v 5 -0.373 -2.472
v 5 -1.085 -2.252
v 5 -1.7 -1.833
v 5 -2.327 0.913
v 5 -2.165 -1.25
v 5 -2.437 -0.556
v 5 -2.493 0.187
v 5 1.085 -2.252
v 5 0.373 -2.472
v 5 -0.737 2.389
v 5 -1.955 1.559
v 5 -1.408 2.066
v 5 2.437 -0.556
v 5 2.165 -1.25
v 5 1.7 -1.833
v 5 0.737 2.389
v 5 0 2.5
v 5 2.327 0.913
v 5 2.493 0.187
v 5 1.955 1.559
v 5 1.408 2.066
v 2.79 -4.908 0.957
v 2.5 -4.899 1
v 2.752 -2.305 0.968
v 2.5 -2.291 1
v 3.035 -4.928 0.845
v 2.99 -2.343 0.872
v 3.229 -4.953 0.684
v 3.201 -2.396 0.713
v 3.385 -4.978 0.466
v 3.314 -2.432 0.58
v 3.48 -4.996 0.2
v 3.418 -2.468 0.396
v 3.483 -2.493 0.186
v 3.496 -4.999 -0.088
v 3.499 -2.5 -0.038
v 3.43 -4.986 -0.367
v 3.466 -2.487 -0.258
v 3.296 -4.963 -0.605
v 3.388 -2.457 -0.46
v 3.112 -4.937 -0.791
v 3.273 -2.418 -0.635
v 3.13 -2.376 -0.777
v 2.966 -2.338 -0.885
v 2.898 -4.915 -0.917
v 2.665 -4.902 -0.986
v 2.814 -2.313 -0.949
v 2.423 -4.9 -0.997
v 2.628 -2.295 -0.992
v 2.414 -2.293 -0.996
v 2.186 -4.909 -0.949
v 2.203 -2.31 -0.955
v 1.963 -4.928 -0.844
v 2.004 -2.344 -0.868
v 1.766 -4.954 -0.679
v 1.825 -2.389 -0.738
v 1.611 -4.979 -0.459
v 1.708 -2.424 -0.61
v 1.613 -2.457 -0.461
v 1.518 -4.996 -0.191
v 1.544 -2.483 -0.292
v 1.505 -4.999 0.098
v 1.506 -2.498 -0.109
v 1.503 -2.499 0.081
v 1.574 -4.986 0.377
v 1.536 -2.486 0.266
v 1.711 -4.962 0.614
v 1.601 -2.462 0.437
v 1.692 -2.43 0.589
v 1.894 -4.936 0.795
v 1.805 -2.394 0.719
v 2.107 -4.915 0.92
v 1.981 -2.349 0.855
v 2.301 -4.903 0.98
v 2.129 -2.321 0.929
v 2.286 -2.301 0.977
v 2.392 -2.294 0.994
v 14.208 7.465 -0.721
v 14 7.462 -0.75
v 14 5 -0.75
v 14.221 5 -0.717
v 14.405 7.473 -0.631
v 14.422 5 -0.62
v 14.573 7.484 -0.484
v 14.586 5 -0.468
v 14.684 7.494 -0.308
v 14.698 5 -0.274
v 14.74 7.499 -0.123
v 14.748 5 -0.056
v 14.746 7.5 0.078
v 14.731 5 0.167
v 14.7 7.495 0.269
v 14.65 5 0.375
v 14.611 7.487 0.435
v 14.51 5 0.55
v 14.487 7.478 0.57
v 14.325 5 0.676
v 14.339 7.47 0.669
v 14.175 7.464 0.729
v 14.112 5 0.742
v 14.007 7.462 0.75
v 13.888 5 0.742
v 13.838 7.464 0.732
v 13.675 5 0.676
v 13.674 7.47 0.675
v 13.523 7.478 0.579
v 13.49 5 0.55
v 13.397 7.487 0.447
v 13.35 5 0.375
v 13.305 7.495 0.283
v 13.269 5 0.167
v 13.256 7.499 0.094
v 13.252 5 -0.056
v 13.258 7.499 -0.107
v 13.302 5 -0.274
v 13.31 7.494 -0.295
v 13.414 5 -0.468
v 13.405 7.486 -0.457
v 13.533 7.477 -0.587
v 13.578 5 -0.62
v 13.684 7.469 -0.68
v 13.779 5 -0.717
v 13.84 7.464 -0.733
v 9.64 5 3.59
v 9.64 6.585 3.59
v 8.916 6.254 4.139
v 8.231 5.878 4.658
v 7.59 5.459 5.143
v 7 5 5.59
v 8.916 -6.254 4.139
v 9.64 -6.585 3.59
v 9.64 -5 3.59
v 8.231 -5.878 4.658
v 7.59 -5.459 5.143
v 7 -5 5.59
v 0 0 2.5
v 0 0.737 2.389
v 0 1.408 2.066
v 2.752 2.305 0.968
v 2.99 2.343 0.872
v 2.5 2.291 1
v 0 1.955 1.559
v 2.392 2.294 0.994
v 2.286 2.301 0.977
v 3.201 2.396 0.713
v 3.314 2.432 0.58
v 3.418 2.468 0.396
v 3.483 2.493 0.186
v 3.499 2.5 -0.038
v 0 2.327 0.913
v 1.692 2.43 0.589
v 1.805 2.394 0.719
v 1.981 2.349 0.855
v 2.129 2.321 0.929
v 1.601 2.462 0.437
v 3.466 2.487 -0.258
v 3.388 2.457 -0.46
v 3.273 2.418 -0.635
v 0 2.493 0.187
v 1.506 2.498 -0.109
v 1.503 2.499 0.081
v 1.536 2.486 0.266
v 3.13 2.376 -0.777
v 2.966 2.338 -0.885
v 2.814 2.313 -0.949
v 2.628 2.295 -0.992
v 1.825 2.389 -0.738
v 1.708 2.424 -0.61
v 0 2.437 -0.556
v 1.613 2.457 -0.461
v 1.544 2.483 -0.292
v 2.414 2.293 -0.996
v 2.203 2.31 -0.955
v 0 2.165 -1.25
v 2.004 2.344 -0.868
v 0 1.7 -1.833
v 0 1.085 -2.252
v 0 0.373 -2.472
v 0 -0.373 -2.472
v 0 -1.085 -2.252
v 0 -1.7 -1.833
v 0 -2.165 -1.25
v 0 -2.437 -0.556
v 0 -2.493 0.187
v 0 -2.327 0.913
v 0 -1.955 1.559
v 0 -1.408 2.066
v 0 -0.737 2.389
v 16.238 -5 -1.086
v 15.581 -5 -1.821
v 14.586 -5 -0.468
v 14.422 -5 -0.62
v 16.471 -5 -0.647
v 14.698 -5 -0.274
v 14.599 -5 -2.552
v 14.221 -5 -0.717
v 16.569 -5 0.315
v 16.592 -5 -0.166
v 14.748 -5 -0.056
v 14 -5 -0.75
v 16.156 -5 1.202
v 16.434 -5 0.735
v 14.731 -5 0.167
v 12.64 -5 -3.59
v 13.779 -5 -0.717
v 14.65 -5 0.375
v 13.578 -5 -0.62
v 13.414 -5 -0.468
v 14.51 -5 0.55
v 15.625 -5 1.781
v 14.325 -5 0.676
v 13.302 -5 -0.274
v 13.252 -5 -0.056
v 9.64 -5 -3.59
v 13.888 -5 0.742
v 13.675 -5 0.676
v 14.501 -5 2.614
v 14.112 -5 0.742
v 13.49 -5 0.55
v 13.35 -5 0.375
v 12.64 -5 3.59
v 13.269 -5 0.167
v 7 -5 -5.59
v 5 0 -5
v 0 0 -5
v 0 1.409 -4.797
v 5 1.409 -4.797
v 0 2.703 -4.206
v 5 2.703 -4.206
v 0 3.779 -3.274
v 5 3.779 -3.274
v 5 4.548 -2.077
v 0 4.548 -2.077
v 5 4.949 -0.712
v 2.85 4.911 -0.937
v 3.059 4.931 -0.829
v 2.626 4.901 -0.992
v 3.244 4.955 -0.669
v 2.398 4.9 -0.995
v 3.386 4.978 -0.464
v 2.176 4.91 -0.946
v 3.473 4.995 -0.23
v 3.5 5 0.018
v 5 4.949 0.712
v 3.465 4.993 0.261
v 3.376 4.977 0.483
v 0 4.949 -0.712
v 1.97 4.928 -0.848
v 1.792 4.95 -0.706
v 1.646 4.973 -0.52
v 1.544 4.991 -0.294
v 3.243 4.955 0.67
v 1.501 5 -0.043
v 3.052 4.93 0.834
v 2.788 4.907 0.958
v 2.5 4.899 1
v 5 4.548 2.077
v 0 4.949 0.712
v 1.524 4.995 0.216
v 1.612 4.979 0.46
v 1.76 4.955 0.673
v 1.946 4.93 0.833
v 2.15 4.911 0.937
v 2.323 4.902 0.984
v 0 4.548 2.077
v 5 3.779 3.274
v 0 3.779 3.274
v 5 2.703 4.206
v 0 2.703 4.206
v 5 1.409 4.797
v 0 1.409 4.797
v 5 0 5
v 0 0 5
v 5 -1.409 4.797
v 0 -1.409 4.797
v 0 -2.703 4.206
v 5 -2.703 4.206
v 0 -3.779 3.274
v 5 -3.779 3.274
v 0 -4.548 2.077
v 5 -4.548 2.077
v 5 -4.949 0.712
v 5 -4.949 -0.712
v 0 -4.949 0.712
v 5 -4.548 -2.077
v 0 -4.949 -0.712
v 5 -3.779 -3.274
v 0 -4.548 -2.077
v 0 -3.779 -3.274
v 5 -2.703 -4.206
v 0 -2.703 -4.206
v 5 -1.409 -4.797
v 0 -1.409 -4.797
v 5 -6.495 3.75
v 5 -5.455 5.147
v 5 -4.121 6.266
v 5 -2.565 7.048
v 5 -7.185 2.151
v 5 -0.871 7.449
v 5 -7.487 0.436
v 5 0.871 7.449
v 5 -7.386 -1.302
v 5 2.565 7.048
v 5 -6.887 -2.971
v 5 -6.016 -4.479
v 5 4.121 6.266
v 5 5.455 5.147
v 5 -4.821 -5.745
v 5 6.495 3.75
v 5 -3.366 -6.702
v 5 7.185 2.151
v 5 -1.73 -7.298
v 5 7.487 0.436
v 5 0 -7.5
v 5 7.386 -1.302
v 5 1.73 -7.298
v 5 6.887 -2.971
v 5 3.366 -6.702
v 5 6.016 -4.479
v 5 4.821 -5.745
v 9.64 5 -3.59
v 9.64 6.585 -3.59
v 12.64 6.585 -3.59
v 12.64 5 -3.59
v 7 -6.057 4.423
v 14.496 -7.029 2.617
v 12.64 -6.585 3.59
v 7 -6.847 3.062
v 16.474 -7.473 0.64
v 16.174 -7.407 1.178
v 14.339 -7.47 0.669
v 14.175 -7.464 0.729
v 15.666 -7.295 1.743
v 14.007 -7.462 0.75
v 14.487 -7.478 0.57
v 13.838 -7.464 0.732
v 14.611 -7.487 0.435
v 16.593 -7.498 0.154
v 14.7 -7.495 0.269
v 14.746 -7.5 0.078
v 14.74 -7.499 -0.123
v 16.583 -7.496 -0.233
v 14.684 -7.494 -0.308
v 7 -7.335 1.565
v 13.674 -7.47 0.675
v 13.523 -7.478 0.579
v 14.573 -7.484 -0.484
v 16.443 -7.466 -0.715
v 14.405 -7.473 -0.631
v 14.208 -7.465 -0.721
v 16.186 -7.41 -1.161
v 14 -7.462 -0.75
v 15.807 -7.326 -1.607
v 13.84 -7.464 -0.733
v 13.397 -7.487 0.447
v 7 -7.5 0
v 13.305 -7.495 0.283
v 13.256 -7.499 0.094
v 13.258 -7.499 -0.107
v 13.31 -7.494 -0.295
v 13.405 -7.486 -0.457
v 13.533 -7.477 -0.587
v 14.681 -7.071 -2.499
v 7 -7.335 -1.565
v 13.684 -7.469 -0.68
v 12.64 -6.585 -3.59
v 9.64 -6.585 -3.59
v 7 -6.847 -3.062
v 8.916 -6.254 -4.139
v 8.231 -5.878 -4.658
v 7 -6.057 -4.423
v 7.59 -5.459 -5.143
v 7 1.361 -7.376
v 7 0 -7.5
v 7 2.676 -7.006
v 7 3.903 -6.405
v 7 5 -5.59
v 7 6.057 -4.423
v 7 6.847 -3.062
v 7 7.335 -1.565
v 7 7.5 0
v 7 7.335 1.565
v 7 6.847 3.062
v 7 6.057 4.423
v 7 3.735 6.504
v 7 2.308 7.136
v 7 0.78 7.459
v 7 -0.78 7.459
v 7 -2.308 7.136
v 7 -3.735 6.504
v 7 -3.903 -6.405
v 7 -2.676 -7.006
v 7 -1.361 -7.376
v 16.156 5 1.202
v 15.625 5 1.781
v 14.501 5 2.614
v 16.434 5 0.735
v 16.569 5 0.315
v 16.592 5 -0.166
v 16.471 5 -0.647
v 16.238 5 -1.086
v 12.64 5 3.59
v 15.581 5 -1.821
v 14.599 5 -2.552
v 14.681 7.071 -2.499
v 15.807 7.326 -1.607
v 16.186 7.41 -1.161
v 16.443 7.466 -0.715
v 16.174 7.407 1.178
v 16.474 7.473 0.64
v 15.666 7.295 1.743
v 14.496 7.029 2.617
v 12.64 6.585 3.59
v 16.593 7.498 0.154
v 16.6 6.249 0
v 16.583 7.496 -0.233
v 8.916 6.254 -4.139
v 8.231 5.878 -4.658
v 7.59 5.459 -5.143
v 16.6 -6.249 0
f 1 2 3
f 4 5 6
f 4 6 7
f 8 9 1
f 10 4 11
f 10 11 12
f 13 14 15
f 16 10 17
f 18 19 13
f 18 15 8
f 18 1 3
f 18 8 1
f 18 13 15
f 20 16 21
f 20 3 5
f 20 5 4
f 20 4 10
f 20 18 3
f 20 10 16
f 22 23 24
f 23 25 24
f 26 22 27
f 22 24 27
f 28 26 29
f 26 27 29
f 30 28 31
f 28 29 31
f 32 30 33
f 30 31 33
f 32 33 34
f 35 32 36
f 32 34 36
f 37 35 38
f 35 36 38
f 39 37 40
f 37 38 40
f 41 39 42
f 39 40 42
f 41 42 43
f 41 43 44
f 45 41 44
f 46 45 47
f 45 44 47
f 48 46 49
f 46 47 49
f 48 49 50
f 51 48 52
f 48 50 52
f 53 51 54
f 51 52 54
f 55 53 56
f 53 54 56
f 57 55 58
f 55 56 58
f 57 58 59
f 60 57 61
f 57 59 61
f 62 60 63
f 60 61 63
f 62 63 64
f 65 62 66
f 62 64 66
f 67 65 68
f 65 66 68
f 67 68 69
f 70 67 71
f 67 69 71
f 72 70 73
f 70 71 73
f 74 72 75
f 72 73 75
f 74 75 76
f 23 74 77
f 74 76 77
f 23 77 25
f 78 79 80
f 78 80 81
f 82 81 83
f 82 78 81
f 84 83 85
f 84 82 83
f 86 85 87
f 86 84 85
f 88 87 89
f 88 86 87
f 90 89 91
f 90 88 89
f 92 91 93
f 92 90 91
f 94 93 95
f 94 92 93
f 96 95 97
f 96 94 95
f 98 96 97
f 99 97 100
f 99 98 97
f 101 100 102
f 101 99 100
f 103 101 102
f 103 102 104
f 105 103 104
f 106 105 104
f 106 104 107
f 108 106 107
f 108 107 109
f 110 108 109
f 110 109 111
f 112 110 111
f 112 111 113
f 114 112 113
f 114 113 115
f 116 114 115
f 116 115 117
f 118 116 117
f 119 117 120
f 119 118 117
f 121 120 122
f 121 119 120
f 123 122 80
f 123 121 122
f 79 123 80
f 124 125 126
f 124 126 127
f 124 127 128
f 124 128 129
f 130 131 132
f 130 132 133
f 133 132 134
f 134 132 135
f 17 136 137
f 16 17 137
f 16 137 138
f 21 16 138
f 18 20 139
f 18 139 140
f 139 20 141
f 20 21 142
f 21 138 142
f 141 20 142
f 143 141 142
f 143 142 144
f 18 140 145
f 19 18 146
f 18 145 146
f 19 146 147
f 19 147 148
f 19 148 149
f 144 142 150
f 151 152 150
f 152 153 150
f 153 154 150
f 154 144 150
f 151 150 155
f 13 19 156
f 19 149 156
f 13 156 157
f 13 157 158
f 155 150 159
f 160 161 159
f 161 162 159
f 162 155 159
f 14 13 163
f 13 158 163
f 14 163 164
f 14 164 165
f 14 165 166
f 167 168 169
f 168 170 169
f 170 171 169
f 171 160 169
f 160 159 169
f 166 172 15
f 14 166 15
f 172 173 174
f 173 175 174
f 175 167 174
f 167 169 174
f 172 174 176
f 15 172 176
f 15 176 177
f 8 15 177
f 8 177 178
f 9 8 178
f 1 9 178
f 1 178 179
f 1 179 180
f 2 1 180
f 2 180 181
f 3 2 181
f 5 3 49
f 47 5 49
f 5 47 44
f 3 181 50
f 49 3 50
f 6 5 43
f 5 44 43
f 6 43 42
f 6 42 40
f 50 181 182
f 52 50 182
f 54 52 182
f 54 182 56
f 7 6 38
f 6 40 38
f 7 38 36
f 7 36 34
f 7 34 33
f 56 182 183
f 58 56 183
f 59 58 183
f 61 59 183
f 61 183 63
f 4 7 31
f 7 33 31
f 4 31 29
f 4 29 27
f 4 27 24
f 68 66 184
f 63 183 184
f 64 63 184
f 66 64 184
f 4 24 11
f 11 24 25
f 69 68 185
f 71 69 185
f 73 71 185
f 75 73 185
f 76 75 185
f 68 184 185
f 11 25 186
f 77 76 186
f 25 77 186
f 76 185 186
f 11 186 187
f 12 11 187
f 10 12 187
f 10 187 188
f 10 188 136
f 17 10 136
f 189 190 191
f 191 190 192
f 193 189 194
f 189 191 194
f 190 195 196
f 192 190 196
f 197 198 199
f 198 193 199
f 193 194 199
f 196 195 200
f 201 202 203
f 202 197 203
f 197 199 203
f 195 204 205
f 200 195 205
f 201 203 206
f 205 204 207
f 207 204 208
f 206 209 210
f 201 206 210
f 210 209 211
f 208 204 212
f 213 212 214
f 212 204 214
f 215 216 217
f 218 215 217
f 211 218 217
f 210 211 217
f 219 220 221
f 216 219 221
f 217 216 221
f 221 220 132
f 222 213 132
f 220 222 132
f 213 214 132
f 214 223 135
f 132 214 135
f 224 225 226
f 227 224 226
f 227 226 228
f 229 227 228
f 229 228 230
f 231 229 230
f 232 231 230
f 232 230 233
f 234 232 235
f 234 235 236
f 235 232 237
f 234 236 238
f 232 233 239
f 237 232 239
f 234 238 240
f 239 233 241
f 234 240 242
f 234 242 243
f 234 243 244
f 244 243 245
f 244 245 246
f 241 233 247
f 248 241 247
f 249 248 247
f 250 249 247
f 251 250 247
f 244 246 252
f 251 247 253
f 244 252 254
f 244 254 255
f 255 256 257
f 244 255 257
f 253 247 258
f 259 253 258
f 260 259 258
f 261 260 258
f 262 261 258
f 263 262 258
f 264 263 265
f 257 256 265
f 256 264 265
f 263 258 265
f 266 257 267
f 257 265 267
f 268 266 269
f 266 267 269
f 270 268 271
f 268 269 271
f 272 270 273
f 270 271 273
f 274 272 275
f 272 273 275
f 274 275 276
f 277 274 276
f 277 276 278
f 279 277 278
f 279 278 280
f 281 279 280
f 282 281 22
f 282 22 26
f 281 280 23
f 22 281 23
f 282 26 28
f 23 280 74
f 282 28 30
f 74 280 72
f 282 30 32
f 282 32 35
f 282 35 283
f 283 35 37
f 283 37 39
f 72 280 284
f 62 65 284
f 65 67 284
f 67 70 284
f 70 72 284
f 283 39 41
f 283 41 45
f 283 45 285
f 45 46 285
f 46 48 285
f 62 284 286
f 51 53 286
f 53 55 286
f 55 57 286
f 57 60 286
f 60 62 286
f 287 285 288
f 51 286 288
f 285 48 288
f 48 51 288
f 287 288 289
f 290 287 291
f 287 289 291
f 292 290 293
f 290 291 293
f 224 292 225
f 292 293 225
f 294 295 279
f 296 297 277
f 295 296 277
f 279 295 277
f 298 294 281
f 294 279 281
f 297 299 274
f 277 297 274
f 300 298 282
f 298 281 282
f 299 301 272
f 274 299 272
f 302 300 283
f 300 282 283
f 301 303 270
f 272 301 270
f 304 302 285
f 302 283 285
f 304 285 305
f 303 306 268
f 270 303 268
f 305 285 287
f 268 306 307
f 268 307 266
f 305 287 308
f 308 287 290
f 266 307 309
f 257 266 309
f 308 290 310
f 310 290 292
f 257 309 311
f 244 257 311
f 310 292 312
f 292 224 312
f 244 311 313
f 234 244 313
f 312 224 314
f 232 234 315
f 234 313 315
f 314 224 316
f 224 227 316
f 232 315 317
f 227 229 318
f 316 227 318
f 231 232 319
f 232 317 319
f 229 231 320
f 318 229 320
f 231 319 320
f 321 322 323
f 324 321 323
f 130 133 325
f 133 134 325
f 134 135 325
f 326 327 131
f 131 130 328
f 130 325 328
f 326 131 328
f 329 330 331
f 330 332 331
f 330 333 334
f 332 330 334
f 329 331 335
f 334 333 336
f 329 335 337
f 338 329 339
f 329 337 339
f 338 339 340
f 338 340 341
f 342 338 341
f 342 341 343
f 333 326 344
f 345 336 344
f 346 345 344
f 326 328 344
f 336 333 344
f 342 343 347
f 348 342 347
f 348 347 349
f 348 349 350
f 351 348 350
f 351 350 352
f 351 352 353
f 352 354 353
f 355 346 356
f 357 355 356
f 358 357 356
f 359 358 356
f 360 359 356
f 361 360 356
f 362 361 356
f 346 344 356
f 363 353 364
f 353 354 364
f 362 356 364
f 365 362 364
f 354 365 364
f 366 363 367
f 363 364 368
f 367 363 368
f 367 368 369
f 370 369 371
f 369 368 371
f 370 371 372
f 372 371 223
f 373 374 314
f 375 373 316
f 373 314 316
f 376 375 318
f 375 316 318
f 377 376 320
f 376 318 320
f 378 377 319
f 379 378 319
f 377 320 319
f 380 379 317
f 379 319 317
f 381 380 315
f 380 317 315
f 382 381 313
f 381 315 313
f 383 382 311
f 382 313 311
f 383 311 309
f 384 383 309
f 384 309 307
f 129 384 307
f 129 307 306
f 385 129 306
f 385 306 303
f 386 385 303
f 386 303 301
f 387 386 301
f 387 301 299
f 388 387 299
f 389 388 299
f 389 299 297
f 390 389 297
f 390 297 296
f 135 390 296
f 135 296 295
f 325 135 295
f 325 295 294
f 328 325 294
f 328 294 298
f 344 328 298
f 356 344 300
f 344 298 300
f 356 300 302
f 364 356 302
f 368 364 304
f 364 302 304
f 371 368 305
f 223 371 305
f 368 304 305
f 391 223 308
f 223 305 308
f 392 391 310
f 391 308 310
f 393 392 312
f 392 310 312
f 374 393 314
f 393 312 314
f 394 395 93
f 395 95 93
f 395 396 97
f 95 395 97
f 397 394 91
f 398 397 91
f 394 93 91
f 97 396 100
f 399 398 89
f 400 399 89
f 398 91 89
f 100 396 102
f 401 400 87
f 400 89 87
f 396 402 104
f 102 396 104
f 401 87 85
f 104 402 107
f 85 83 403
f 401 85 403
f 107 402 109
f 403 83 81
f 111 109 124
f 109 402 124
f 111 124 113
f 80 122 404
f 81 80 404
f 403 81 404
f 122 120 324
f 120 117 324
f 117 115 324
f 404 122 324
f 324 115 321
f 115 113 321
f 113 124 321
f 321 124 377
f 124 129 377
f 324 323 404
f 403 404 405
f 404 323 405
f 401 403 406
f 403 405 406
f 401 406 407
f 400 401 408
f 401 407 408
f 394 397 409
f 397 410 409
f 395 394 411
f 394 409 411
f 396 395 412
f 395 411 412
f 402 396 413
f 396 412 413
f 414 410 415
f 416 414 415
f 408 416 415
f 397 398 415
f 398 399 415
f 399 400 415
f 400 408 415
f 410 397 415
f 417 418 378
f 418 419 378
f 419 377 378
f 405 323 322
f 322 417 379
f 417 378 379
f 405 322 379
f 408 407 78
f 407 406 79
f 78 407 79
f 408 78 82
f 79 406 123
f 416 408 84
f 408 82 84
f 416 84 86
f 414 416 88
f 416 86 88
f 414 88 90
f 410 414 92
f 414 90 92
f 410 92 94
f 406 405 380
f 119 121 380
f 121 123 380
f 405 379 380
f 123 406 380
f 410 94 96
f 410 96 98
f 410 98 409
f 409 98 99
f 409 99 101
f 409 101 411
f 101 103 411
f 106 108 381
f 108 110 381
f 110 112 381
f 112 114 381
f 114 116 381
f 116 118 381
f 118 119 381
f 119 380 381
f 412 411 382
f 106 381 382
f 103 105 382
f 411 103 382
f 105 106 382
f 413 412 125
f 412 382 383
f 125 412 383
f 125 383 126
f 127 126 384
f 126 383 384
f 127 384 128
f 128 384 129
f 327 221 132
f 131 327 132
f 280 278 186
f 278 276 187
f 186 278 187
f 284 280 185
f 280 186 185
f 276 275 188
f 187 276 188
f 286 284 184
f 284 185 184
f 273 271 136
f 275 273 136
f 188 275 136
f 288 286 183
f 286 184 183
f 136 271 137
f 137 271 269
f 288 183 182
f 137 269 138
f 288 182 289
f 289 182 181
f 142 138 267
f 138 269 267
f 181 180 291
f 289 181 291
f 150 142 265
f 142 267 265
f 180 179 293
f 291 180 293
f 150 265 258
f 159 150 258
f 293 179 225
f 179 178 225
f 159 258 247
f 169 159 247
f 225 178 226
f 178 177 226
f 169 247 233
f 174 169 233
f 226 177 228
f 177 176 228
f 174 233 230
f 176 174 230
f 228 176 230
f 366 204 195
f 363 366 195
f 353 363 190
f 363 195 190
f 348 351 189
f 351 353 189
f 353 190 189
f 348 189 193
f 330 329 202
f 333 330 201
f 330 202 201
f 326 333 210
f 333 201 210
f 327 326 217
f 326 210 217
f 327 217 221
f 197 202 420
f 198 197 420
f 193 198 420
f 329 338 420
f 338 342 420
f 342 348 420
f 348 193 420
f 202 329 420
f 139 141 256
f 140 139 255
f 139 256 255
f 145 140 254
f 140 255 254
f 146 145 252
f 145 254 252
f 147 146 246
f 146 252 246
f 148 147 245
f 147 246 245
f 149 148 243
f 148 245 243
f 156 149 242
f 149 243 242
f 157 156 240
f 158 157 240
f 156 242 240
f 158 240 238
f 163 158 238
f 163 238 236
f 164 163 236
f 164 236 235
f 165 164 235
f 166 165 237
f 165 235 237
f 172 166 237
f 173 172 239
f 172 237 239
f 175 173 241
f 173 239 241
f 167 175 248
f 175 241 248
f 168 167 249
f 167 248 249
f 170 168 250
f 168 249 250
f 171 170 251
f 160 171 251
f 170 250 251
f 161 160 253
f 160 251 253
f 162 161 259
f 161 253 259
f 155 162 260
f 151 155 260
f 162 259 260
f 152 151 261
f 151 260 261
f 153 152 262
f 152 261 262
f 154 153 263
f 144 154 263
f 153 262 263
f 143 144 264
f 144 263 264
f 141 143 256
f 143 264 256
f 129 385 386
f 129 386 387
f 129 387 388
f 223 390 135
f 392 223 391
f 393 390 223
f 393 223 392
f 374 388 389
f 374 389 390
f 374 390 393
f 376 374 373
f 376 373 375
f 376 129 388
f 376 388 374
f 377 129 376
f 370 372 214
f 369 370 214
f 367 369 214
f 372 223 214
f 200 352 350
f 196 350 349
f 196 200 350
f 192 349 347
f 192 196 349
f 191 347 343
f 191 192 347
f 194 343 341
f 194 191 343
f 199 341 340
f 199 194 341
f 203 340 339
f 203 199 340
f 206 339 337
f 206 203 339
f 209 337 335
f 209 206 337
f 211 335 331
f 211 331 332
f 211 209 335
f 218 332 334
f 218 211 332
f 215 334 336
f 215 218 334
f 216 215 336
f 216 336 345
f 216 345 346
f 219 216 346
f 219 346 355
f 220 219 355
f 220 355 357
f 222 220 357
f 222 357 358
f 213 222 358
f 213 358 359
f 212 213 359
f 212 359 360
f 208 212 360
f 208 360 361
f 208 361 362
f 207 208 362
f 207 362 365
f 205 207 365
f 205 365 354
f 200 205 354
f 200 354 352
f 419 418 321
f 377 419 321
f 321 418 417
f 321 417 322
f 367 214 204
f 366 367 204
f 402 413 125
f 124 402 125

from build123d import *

# Parameters (mm, degrees)
SKETCH1_R               = 5
BOSS_EXTRUDE1_DEPTH     = 5
SKETCH2_R               = 7.5
BOSS_EXTRUDE2_DEPTH     = 2
BOSS_EXTRUDE3_DEPTH     = 10
CUT_EXTRUDE1_DEPTH      = 23.394195677
CUT_EXTRUDE1_DEPTH_BACK = 23.394195677
CUT_EXTRUDE2_DEPTH      = 23.092080194
CUT_EXTRUDE2_DEPTH_BACK = 23.092080194
SKETCH5_R               = 0.75
SKETCH6_R               = 2.5
CUT_EXTRUDE3_DEPTH      = 5
SKETCH7_R               = 1
CUT_EXTRUDE4_DEPTH      = 10


with BuildPart() as part:
    # Sketch1 → Boss-Extrude1 (new body)
    with BuildSketch(Plane(origin=(0, 0, 0), x_dir=(0, 0, -1), z_dir=(1, 0, 0))):
        Circle(SKETCH1_R)
    extrude(amount=BOSS_EXTRUDE1_DEPTH)

    # Sketch2 → Boss-Extrude2 (add)
    with BuildSketch(Plane(origin=(5, 0, 0), x_dir=(0, 0, -1), z_dir=(1, 0, 0))):
        Circle(SKETCH2_R)
    extrude(amount=BOSS_EXTRUDE2_DEPTH)

    # Sketch3 → Boss-Extrude3 (add)
    with BuildSketch(Plane(origin=(7, 0, 0), x_dir=(0, 0, -1), z_dir=(1, 0, 0))):
        with BuildLine():
            ThreePointArc((5.590169944, 5), (0, 7.5), (-5.590169944, 5))
            Line((-5.590169944, 5), (-4.898979486, 5))
            Line((-4.898979486, 5), (4.898979486, 5))
            Line((4.898979486, 5), (5.590169944, 5))
        make_face()
        with BuildLine():
            Line((-4.898979486, -5), (-5.590169944, -5))
            ThreePointArc((-5.590169944, -5), (0, -7.5), (5.590169944, -5))
            Line((5.590169944, -5), (4.898979486, -5))
            Line((4.898979486, -5), (-4.898979486, -5))
        make_face()
    extrude(amount=BOSS_EXTRUDE3_DEPTH)

    # Sketch4 → Cut-Extrude1 (cut, two sides: drawn at the far end of the back side and taken through both)
    with BuildSketch(Plane.XZ.offset(-5).offset(-CUT_EXTRUDE1_DEPTH_BACK)):
        with BuildLine():
            Line((7, 5.590169944), (17, 5.590169944))
            Line((17, 5.590169944), (17, -5.590169944))
            Line((17, -5.590169944), (7, -5.590169944))
            Line((7, -5.590169944), (9.640400827, -3.590169944))
            Line((9.640400827, -3.590169944), (12.640400827, -3.590169944))
            add(Edge.make_bspline(
                [(12.640400827, -3.590169944), (15.280133609, -2.393446629), (17.919866391, 0), (15.280133609, 2.393446629), (12.640400827, 3.590169944)],
                knots=[0.178885438, 0.178885438, 0.178885438, 0.178885438, 0.5, 0.821114562, 0.821114562, 0.821114562, 0.821114562], degree=3))
            Line((12.640400827, 3.590169944), (9.640400827, 3.590169944))
            Line((9.640400827, 3.590169944), (7, 5.590169944))
        make_face()
    extrude(amount=CUT_EXTRUDE1_DEPTH + CUT_EXTRUDE1_DEPTH_BACK, mode=Mode.SUBTRACT)

    # Sketch5 → Cut-Extrude2 (cut, two sides: drawn at the far end of the back side and taken through both)
    with BuildSketch(Plane.XZ.offset(-5).offset(-CUT_EXTRUDE2_DEPTH_BACK)):
        with Locations(Location((14, 0, 0), (0, 0, 270))):
            Circle(SKETCH5_R)
    extrude(amount=CUT_EXTRUDE2_DEPTH + CUT_EXTRUDE2_DEPTH_BACK, mode=Mode.SUBTRACT)

    # Sketch6 → Cut-Extrude3 (cut)
    with BuildSketch(Plane.ZY):
        Circle(SKETCH6_R)
    extrude(amount=-CUT_EXTRUDE3_DEPTH, mode=Mode.SUBTRACT)

    # Sketch7 → Cut-Extrude4 (cut, symmetric)
    with BuildSketch(Plane(origin=(0, 0, 0), x_dir=(1, 0, 0), z_dir=(0, 1, 0))):
        with Locations(Location((2.5, 0, 0), (0, 0, 270))):
            Circle(SKETCH7_R)
    extrude(amount=CUT_EXTRUDE4_DEPTH, both=True, mode=Mode.SUBTRACT)


solid = part.part
